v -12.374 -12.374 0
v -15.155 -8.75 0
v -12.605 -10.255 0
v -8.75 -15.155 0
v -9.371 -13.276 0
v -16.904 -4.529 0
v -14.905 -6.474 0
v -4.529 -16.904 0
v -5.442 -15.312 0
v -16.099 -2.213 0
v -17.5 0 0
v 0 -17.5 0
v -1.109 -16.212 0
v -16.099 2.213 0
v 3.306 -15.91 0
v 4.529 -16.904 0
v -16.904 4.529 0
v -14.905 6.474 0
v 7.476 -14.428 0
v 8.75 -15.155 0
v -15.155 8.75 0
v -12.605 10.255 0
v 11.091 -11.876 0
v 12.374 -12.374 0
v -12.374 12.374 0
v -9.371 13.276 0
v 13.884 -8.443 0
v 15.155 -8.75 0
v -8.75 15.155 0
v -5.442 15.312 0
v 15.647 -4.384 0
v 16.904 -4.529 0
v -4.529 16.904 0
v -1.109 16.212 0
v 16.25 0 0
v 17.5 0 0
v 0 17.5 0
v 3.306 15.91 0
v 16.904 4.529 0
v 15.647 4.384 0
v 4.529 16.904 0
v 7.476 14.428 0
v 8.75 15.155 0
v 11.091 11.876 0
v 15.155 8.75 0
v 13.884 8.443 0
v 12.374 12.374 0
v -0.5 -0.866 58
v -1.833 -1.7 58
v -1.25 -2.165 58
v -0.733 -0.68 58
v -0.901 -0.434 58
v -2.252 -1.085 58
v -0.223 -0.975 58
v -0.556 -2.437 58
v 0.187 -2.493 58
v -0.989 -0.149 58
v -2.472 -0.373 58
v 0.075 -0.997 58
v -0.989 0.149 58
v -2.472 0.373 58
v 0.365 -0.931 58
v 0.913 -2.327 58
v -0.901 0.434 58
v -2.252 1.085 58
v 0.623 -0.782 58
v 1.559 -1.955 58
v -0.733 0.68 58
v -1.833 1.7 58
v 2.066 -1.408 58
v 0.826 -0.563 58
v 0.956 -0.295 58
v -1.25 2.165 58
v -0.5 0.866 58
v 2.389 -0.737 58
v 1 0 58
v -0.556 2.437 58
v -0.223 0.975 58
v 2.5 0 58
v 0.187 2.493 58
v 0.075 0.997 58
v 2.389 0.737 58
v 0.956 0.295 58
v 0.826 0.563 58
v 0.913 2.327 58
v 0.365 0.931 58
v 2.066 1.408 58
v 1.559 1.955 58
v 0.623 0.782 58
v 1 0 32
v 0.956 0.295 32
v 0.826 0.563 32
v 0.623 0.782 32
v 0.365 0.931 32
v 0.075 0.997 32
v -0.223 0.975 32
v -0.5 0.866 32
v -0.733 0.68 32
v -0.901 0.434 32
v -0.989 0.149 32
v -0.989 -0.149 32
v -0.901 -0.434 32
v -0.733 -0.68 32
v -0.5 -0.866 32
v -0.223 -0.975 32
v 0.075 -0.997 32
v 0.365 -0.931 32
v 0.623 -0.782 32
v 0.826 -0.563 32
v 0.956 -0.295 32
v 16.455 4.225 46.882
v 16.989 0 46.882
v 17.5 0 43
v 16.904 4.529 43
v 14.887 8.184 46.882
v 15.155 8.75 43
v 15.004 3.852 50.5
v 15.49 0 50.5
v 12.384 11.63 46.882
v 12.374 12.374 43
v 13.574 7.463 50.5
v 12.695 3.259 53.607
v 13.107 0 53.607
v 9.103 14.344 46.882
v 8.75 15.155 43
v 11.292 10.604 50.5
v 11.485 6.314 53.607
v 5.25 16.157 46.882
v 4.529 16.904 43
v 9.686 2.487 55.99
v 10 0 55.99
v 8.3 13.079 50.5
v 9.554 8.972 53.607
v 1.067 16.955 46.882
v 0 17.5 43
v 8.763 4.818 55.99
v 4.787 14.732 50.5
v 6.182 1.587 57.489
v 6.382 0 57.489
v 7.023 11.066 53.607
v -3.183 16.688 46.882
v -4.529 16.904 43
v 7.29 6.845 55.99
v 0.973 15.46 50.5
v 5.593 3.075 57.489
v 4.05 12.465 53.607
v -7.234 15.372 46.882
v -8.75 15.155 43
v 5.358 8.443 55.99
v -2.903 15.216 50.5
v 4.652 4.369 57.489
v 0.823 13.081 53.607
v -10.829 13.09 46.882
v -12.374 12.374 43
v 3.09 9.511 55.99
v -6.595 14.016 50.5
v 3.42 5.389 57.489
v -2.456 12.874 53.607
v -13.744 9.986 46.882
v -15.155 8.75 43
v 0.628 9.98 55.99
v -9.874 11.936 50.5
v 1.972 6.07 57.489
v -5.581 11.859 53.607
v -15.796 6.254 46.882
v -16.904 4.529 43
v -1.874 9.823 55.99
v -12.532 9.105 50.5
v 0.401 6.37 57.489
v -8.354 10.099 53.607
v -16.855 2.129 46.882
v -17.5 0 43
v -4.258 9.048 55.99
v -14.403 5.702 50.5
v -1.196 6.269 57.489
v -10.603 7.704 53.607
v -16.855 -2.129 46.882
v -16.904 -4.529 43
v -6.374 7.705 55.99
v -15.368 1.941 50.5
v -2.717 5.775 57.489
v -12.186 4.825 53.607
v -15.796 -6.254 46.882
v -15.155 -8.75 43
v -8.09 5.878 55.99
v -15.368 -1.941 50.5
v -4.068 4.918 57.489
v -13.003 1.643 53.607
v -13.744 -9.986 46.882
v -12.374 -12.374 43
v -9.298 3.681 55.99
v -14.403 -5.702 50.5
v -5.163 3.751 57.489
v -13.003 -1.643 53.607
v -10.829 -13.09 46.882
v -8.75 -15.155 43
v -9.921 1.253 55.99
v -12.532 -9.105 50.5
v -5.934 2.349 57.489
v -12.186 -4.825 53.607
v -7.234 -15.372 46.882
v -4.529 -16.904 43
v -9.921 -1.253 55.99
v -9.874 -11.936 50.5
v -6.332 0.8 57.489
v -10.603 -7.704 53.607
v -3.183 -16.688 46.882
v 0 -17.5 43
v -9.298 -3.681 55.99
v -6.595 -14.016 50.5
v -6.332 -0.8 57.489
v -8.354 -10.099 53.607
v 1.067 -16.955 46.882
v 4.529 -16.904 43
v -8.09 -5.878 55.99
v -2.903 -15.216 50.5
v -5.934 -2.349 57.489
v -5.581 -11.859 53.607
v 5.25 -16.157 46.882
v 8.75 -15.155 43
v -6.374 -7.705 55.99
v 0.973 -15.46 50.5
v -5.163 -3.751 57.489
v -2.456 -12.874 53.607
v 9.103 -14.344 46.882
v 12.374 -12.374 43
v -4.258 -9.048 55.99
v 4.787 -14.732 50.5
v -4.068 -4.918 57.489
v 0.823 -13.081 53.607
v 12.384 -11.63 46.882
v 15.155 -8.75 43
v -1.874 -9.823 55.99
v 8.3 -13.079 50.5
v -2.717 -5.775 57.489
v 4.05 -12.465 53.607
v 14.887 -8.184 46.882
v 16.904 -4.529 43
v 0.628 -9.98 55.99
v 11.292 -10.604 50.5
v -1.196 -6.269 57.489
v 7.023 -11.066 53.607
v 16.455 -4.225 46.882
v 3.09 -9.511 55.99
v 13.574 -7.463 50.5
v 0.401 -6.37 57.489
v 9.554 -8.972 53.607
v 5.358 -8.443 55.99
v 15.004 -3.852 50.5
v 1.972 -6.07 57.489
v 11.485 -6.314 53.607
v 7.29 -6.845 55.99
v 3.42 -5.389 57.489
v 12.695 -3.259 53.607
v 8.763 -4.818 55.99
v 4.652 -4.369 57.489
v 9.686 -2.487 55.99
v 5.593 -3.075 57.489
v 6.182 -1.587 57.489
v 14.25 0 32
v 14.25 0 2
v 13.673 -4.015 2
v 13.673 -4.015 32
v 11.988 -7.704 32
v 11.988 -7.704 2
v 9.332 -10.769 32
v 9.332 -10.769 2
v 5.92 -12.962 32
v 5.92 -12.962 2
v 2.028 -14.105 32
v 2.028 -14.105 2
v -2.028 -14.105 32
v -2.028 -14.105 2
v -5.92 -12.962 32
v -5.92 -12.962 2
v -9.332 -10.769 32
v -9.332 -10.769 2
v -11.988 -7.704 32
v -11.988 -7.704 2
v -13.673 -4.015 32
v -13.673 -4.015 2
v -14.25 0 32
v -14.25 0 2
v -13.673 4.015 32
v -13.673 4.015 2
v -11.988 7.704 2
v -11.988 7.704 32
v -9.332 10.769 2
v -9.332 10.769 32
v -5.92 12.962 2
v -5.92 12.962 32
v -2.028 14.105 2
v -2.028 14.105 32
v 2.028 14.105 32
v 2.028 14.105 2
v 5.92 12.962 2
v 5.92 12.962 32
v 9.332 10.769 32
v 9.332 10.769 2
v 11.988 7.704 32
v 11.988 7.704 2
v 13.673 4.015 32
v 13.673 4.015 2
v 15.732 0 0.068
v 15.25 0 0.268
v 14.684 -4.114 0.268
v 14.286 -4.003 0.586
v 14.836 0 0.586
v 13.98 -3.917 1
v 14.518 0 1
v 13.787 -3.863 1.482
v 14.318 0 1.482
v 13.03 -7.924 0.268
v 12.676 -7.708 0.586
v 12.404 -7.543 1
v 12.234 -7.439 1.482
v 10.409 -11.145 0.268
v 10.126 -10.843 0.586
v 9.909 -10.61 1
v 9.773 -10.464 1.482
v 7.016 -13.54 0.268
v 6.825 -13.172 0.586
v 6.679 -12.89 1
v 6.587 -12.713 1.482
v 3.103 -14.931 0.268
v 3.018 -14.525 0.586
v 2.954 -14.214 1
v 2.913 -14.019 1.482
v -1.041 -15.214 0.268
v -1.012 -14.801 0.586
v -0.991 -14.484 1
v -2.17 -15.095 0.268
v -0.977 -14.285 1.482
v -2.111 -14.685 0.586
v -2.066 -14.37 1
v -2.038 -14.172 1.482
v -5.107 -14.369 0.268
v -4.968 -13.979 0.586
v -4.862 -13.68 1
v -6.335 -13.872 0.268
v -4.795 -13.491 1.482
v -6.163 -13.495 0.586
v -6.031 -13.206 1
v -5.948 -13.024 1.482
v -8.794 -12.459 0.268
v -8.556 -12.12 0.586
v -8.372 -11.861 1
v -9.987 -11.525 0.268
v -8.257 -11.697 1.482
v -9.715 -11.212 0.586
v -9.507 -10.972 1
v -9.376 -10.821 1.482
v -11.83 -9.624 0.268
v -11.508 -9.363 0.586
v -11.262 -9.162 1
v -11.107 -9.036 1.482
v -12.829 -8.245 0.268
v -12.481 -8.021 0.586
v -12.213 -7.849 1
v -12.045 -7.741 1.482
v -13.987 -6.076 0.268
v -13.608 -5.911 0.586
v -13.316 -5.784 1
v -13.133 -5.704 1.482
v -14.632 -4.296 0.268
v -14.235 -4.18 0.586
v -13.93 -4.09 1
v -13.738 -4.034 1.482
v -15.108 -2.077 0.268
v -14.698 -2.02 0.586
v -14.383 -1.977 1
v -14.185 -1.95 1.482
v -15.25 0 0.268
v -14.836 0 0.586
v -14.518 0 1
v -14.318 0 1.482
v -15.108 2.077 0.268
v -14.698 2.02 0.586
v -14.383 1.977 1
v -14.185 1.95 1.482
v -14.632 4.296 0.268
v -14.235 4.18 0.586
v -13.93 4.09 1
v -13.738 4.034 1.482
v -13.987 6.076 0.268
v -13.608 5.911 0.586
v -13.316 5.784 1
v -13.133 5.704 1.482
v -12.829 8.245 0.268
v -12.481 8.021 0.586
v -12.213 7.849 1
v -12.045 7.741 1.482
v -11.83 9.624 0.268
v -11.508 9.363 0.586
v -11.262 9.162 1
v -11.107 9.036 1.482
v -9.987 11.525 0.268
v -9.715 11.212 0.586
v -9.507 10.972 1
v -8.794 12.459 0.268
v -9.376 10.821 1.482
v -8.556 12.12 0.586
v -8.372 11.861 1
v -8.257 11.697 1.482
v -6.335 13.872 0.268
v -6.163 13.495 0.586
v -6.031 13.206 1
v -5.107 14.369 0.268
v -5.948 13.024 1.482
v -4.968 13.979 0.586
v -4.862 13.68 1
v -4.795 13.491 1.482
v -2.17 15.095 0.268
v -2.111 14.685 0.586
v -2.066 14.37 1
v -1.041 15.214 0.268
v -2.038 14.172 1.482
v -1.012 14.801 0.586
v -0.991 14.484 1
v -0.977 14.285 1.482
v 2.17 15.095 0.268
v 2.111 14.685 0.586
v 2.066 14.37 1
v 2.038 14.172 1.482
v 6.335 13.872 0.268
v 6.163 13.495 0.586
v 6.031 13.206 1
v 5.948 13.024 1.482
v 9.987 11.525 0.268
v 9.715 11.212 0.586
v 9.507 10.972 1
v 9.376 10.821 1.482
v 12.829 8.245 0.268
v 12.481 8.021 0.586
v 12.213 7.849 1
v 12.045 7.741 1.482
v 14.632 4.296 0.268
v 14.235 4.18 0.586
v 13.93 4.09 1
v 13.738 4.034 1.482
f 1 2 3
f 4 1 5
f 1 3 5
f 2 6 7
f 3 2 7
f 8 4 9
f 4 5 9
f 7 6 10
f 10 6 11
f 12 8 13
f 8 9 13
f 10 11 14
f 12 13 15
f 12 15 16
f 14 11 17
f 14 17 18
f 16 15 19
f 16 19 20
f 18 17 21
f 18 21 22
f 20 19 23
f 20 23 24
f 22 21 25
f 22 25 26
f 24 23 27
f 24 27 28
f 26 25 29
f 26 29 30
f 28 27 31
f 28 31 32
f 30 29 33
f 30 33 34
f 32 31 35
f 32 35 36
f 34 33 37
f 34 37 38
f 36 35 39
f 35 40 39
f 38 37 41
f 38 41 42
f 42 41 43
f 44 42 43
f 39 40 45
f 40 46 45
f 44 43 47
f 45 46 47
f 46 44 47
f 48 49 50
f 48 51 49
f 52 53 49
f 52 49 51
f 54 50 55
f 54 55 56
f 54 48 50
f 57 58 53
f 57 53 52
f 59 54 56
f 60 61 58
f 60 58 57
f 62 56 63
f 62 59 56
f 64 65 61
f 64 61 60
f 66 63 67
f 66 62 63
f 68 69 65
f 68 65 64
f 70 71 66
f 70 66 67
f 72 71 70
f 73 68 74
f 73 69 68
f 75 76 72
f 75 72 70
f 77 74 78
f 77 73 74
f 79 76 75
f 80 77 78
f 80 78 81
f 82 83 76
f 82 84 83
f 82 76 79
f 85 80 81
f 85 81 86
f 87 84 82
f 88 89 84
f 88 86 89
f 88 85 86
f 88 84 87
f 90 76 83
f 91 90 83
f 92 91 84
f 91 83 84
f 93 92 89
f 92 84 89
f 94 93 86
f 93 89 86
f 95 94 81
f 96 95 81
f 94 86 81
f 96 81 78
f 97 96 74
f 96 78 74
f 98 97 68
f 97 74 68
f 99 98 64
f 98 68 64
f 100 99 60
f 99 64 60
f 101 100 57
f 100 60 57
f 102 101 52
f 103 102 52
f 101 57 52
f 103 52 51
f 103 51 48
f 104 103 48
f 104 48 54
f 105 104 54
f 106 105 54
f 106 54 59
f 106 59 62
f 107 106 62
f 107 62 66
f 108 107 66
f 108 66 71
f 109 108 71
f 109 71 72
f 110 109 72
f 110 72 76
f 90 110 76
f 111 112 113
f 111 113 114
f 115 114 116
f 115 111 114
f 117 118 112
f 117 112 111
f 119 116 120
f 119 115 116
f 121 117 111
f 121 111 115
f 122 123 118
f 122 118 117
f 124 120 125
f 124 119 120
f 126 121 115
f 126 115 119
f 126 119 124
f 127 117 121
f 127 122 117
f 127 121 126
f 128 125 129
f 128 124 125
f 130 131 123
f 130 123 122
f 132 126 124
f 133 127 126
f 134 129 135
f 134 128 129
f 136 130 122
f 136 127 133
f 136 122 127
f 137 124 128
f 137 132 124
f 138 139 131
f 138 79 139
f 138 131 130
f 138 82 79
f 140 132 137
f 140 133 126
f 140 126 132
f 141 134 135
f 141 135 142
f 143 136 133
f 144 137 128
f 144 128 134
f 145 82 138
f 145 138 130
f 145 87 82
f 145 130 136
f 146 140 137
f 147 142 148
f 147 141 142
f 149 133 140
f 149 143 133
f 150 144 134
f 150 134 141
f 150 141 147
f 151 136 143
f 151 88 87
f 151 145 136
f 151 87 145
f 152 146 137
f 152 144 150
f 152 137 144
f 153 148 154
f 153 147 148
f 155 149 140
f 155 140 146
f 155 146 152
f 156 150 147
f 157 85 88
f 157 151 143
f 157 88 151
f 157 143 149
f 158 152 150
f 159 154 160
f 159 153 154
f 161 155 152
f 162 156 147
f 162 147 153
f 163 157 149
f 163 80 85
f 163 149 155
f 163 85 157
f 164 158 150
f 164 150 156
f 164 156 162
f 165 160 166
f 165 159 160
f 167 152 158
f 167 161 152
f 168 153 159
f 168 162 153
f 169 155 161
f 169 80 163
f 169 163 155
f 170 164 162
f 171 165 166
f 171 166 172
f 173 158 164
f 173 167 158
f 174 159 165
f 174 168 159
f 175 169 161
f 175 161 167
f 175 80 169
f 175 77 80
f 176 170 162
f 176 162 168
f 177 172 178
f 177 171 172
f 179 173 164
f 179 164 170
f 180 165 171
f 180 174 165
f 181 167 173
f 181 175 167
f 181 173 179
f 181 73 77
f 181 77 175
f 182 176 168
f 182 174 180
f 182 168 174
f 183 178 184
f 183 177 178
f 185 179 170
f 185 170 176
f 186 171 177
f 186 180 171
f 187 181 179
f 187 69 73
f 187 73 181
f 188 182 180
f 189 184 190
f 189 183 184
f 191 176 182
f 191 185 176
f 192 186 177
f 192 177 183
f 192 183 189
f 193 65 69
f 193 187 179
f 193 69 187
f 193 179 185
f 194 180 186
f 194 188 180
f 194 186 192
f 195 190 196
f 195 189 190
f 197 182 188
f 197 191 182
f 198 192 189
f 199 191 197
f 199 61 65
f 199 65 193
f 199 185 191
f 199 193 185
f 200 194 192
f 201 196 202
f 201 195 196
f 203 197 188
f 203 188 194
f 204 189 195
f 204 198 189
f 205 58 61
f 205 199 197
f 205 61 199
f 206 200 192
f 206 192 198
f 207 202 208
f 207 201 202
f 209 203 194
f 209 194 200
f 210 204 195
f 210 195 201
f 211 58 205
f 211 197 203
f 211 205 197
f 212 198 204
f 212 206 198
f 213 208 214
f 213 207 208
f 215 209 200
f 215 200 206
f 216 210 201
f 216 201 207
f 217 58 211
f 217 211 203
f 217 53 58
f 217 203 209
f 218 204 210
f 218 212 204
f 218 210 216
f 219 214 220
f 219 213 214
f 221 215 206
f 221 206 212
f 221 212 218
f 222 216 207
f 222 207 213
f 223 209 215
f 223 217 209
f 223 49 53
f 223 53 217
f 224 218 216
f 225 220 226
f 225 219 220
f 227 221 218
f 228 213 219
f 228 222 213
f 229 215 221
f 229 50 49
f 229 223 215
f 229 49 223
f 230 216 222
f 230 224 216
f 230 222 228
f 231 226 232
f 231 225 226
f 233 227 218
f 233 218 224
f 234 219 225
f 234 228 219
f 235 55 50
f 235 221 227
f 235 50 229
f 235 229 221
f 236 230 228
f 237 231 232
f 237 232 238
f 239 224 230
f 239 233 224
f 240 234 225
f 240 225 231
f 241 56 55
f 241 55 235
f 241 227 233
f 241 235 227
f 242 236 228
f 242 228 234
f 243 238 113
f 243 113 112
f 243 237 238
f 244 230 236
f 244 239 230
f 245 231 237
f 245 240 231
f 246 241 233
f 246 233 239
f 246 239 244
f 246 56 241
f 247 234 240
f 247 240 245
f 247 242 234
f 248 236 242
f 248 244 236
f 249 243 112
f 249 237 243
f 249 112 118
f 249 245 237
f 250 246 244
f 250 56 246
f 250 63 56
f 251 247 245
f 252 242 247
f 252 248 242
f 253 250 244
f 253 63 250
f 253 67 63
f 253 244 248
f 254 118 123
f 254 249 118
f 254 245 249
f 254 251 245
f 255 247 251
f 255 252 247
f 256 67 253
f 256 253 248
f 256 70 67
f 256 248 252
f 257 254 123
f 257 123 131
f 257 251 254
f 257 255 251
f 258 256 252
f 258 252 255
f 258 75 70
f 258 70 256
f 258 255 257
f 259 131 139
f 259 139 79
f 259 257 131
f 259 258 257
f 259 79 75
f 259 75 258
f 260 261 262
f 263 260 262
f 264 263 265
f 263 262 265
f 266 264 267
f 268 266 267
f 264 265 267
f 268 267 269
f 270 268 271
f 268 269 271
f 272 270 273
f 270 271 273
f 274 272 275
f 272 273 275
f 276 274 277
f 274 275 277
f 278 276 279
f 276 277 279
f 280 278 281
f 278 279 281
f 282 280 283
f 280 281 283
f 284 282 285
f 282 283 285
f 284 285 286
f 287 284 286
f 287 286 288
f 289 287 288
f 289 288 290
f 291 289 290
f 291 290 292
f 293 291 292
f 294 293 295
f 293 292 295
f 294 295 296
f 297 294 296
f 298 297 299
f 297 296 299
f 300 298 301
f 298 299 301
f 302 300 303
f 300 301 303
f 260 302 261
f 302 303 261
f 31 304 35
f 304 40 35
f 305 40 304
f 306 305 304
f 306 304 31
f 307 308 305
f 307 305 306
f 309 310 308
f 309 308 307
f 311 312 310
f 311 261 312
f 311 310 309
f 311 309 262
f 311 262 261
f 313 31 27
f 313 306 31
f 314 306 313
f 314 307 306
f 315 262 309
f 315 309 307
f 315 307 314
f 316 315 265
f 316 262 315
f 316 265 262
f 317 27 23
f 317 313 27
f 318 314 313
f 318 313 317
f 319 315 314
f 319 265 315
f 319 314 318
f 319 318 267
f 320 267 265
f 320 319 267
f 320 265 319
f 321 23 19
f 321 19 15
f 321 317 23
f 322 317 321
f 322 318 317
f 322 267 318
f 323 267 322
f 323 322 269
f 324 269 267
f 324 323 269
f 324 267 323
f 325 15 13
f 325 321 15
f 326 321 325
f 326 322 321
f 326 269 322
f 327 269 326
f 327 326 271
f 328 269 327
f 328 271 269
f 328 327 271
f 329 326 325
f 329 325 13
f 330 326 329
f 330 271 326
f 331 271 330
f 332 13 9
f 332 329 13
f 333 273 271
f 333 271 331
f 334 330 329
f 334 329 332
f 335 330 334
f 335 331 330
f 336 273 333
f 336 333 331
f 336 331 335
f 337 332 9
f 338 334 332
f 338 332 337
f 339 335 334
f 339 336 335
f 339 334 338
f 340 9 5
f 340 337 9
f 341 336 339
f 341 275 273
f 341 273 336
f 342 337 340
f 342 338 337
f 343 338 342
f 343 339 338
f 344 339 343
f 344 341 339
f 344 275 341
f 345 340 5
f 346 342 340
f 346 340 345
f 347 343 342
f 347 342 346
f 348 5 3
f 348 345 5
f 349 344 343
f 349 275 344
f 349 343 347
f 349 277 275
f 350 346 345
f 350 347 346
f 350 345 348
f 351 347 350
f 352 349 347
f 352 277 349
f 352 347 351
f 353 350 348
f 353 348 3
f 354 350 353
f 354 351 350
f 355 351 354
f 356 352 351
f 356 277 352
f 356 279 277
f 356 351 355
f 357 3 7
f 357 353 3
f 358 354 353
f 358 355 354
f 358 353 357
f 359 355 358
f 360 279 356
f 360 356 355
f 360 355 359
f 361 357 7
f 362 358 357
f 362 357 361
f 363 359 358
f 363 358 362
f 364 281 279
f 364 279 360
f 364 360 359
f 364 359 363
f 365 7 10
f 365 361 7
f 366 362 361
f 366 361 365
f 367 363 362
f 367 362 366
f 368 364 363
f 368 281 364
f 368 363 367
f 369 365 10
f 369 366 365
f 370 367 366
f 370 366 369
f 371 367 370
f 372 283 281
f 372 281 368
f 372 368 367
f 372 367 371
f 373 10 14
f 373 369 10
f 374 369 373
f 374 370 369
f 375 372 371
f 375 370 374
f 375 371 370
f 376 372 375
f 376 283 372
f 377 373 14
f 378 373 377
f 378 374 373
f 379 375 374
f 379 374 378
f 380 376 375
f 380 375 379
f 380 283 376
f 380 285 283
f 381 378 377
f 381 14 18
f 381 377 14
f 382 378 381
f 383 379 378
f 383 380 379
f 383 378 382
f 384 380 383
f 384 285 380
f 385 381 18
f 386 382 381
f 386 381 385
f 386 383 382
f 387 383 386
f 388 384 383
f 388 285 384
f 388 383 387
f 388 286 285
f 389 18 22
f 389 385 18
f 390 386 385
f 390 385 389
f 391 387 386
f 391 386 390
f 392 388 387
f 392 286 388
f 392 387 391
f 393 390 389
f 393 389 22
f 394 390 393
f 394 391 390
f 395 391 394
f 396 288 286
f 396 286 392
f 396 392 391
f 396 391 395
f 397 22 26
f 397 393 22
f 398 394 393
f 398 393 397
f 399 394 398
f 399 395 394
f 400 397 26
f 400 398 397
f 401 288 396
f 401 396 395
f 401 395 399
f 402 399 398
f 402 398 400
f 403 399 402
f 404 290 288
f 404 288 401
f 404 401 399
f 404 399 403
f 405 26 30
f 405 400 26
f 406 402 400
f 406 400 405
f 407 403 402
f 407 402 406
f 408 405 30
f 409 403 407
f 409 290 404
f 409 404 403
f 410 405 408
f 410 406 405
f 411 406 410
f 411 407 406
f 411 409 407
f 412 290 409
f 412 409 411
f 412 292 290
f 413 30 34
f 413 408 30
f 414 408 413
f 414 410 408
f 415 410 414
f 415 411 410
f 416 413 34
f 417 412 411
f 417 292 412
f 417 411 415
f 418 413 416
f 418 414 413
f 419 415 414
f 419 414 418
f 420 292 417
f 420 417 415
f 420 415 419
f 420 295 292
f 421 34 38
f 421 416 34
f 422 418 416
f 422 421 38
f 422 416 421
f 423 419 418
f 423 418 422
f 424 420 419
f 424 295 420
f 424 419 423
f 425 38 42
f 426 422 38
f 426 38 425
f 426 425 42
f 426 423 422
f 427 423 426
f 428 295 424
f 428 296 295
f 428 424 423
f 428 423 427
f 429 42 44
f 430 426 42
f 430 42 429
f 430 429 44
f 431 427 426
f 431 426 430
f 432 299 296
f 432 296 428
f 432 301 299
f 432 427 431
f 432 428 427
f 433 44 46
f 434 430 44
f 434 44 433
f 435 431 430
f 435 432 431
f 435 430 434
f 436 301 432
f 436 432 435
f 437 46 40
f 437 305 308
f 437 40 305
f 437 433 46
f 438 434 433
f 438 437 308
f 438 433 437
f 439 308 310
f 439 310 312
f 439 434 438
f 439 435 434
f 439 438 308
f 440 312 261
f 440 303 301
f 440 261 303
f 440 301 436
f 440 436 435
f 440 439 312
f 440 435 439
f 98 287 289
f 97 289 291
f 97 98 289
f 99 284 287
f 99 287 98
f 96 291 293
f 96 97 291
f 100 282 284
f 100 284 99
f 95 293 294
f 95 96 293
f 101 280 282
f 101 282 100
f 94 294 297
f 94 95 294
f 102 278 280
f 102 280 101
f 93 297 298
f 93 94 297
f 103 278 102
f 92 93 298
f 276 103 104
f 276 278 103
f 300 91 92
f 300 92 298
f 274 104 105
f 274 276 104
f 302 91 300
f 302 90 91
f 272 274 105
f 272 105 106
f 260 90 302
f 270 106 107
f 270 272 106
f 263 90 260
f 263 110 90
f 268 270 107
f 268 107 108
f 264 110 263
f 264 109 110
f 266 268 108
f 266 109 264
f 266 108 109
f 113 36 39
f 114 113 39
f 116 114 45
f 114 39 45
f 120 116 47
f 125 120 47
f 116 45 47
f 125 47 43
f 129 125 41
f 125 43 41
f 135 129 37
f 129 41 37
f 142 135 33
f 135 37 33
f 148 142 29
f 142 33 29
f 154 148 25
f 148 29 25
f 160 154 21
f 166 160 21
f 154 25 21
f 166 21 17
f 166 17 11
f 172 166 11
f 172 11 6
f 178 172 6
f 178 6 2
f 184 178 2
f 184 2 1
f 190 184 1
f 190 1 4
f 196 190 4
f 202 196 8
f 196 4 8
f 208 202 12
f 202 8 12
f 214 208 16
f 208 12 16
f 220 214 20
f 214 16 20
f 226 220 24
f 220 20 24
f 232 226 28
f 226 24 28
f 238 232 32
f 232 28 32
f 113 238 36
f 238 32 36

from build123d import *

# Parameters (mm, degrees)
SKETCH_R        = 17.5
PAD_DEPTH       = 58
FILLET_R        = 15
SKETCH001_R     = 14.25
POCKET_DEPTH    = 32
SKETCH002_R     = 1
POCKET001_DEPTH = 58.001
FILLET001_R     = 2


with BuildPart() as part:
    # Sketch → Pad (new body)
    with BuildSketch(Plane.XY):
        Circle(SKETCH_R)
    extrude(amount=PAD_DEPTH)

    # Fillet
    fillet_edges = [part.edges().sort_by_distance(p)[0] for p in [
        (-17.5, 0, 58),
    ]]
    fillet(fillet_edges, radius=FILLET_R)

    # Sketch001 (on Face3 of Fillet) → Pocket (cut)
    with BuildSketch(Plane(origin=(0, 0, 0), x_dir=(1, 0, 0), z_dir=(0, 0, -1))):
        Circle(SKETCH001_R)
    extrude(amount=-POCKET_DEPTH, mode=Mode.SUBTRACT)

    # Sketch002 (on Face4 of Fillet) → Pocket001 (cut, through all)
    with BuildSketch(Plane.XY.offset(58)):
        Circle(SKETCH002_R)
    extrude(amount=-POCKET001_DEPTH, mode=Mode.SUBTRACT)

    # Fillet001
    fillet001_edges = [part.edges().sort_by_distance(p)[0] for p in [
        (-14.25, 0, 0),
    ]]
    fillet(fillet001_edges, radius=FILLET001_R)


solid = part.part
